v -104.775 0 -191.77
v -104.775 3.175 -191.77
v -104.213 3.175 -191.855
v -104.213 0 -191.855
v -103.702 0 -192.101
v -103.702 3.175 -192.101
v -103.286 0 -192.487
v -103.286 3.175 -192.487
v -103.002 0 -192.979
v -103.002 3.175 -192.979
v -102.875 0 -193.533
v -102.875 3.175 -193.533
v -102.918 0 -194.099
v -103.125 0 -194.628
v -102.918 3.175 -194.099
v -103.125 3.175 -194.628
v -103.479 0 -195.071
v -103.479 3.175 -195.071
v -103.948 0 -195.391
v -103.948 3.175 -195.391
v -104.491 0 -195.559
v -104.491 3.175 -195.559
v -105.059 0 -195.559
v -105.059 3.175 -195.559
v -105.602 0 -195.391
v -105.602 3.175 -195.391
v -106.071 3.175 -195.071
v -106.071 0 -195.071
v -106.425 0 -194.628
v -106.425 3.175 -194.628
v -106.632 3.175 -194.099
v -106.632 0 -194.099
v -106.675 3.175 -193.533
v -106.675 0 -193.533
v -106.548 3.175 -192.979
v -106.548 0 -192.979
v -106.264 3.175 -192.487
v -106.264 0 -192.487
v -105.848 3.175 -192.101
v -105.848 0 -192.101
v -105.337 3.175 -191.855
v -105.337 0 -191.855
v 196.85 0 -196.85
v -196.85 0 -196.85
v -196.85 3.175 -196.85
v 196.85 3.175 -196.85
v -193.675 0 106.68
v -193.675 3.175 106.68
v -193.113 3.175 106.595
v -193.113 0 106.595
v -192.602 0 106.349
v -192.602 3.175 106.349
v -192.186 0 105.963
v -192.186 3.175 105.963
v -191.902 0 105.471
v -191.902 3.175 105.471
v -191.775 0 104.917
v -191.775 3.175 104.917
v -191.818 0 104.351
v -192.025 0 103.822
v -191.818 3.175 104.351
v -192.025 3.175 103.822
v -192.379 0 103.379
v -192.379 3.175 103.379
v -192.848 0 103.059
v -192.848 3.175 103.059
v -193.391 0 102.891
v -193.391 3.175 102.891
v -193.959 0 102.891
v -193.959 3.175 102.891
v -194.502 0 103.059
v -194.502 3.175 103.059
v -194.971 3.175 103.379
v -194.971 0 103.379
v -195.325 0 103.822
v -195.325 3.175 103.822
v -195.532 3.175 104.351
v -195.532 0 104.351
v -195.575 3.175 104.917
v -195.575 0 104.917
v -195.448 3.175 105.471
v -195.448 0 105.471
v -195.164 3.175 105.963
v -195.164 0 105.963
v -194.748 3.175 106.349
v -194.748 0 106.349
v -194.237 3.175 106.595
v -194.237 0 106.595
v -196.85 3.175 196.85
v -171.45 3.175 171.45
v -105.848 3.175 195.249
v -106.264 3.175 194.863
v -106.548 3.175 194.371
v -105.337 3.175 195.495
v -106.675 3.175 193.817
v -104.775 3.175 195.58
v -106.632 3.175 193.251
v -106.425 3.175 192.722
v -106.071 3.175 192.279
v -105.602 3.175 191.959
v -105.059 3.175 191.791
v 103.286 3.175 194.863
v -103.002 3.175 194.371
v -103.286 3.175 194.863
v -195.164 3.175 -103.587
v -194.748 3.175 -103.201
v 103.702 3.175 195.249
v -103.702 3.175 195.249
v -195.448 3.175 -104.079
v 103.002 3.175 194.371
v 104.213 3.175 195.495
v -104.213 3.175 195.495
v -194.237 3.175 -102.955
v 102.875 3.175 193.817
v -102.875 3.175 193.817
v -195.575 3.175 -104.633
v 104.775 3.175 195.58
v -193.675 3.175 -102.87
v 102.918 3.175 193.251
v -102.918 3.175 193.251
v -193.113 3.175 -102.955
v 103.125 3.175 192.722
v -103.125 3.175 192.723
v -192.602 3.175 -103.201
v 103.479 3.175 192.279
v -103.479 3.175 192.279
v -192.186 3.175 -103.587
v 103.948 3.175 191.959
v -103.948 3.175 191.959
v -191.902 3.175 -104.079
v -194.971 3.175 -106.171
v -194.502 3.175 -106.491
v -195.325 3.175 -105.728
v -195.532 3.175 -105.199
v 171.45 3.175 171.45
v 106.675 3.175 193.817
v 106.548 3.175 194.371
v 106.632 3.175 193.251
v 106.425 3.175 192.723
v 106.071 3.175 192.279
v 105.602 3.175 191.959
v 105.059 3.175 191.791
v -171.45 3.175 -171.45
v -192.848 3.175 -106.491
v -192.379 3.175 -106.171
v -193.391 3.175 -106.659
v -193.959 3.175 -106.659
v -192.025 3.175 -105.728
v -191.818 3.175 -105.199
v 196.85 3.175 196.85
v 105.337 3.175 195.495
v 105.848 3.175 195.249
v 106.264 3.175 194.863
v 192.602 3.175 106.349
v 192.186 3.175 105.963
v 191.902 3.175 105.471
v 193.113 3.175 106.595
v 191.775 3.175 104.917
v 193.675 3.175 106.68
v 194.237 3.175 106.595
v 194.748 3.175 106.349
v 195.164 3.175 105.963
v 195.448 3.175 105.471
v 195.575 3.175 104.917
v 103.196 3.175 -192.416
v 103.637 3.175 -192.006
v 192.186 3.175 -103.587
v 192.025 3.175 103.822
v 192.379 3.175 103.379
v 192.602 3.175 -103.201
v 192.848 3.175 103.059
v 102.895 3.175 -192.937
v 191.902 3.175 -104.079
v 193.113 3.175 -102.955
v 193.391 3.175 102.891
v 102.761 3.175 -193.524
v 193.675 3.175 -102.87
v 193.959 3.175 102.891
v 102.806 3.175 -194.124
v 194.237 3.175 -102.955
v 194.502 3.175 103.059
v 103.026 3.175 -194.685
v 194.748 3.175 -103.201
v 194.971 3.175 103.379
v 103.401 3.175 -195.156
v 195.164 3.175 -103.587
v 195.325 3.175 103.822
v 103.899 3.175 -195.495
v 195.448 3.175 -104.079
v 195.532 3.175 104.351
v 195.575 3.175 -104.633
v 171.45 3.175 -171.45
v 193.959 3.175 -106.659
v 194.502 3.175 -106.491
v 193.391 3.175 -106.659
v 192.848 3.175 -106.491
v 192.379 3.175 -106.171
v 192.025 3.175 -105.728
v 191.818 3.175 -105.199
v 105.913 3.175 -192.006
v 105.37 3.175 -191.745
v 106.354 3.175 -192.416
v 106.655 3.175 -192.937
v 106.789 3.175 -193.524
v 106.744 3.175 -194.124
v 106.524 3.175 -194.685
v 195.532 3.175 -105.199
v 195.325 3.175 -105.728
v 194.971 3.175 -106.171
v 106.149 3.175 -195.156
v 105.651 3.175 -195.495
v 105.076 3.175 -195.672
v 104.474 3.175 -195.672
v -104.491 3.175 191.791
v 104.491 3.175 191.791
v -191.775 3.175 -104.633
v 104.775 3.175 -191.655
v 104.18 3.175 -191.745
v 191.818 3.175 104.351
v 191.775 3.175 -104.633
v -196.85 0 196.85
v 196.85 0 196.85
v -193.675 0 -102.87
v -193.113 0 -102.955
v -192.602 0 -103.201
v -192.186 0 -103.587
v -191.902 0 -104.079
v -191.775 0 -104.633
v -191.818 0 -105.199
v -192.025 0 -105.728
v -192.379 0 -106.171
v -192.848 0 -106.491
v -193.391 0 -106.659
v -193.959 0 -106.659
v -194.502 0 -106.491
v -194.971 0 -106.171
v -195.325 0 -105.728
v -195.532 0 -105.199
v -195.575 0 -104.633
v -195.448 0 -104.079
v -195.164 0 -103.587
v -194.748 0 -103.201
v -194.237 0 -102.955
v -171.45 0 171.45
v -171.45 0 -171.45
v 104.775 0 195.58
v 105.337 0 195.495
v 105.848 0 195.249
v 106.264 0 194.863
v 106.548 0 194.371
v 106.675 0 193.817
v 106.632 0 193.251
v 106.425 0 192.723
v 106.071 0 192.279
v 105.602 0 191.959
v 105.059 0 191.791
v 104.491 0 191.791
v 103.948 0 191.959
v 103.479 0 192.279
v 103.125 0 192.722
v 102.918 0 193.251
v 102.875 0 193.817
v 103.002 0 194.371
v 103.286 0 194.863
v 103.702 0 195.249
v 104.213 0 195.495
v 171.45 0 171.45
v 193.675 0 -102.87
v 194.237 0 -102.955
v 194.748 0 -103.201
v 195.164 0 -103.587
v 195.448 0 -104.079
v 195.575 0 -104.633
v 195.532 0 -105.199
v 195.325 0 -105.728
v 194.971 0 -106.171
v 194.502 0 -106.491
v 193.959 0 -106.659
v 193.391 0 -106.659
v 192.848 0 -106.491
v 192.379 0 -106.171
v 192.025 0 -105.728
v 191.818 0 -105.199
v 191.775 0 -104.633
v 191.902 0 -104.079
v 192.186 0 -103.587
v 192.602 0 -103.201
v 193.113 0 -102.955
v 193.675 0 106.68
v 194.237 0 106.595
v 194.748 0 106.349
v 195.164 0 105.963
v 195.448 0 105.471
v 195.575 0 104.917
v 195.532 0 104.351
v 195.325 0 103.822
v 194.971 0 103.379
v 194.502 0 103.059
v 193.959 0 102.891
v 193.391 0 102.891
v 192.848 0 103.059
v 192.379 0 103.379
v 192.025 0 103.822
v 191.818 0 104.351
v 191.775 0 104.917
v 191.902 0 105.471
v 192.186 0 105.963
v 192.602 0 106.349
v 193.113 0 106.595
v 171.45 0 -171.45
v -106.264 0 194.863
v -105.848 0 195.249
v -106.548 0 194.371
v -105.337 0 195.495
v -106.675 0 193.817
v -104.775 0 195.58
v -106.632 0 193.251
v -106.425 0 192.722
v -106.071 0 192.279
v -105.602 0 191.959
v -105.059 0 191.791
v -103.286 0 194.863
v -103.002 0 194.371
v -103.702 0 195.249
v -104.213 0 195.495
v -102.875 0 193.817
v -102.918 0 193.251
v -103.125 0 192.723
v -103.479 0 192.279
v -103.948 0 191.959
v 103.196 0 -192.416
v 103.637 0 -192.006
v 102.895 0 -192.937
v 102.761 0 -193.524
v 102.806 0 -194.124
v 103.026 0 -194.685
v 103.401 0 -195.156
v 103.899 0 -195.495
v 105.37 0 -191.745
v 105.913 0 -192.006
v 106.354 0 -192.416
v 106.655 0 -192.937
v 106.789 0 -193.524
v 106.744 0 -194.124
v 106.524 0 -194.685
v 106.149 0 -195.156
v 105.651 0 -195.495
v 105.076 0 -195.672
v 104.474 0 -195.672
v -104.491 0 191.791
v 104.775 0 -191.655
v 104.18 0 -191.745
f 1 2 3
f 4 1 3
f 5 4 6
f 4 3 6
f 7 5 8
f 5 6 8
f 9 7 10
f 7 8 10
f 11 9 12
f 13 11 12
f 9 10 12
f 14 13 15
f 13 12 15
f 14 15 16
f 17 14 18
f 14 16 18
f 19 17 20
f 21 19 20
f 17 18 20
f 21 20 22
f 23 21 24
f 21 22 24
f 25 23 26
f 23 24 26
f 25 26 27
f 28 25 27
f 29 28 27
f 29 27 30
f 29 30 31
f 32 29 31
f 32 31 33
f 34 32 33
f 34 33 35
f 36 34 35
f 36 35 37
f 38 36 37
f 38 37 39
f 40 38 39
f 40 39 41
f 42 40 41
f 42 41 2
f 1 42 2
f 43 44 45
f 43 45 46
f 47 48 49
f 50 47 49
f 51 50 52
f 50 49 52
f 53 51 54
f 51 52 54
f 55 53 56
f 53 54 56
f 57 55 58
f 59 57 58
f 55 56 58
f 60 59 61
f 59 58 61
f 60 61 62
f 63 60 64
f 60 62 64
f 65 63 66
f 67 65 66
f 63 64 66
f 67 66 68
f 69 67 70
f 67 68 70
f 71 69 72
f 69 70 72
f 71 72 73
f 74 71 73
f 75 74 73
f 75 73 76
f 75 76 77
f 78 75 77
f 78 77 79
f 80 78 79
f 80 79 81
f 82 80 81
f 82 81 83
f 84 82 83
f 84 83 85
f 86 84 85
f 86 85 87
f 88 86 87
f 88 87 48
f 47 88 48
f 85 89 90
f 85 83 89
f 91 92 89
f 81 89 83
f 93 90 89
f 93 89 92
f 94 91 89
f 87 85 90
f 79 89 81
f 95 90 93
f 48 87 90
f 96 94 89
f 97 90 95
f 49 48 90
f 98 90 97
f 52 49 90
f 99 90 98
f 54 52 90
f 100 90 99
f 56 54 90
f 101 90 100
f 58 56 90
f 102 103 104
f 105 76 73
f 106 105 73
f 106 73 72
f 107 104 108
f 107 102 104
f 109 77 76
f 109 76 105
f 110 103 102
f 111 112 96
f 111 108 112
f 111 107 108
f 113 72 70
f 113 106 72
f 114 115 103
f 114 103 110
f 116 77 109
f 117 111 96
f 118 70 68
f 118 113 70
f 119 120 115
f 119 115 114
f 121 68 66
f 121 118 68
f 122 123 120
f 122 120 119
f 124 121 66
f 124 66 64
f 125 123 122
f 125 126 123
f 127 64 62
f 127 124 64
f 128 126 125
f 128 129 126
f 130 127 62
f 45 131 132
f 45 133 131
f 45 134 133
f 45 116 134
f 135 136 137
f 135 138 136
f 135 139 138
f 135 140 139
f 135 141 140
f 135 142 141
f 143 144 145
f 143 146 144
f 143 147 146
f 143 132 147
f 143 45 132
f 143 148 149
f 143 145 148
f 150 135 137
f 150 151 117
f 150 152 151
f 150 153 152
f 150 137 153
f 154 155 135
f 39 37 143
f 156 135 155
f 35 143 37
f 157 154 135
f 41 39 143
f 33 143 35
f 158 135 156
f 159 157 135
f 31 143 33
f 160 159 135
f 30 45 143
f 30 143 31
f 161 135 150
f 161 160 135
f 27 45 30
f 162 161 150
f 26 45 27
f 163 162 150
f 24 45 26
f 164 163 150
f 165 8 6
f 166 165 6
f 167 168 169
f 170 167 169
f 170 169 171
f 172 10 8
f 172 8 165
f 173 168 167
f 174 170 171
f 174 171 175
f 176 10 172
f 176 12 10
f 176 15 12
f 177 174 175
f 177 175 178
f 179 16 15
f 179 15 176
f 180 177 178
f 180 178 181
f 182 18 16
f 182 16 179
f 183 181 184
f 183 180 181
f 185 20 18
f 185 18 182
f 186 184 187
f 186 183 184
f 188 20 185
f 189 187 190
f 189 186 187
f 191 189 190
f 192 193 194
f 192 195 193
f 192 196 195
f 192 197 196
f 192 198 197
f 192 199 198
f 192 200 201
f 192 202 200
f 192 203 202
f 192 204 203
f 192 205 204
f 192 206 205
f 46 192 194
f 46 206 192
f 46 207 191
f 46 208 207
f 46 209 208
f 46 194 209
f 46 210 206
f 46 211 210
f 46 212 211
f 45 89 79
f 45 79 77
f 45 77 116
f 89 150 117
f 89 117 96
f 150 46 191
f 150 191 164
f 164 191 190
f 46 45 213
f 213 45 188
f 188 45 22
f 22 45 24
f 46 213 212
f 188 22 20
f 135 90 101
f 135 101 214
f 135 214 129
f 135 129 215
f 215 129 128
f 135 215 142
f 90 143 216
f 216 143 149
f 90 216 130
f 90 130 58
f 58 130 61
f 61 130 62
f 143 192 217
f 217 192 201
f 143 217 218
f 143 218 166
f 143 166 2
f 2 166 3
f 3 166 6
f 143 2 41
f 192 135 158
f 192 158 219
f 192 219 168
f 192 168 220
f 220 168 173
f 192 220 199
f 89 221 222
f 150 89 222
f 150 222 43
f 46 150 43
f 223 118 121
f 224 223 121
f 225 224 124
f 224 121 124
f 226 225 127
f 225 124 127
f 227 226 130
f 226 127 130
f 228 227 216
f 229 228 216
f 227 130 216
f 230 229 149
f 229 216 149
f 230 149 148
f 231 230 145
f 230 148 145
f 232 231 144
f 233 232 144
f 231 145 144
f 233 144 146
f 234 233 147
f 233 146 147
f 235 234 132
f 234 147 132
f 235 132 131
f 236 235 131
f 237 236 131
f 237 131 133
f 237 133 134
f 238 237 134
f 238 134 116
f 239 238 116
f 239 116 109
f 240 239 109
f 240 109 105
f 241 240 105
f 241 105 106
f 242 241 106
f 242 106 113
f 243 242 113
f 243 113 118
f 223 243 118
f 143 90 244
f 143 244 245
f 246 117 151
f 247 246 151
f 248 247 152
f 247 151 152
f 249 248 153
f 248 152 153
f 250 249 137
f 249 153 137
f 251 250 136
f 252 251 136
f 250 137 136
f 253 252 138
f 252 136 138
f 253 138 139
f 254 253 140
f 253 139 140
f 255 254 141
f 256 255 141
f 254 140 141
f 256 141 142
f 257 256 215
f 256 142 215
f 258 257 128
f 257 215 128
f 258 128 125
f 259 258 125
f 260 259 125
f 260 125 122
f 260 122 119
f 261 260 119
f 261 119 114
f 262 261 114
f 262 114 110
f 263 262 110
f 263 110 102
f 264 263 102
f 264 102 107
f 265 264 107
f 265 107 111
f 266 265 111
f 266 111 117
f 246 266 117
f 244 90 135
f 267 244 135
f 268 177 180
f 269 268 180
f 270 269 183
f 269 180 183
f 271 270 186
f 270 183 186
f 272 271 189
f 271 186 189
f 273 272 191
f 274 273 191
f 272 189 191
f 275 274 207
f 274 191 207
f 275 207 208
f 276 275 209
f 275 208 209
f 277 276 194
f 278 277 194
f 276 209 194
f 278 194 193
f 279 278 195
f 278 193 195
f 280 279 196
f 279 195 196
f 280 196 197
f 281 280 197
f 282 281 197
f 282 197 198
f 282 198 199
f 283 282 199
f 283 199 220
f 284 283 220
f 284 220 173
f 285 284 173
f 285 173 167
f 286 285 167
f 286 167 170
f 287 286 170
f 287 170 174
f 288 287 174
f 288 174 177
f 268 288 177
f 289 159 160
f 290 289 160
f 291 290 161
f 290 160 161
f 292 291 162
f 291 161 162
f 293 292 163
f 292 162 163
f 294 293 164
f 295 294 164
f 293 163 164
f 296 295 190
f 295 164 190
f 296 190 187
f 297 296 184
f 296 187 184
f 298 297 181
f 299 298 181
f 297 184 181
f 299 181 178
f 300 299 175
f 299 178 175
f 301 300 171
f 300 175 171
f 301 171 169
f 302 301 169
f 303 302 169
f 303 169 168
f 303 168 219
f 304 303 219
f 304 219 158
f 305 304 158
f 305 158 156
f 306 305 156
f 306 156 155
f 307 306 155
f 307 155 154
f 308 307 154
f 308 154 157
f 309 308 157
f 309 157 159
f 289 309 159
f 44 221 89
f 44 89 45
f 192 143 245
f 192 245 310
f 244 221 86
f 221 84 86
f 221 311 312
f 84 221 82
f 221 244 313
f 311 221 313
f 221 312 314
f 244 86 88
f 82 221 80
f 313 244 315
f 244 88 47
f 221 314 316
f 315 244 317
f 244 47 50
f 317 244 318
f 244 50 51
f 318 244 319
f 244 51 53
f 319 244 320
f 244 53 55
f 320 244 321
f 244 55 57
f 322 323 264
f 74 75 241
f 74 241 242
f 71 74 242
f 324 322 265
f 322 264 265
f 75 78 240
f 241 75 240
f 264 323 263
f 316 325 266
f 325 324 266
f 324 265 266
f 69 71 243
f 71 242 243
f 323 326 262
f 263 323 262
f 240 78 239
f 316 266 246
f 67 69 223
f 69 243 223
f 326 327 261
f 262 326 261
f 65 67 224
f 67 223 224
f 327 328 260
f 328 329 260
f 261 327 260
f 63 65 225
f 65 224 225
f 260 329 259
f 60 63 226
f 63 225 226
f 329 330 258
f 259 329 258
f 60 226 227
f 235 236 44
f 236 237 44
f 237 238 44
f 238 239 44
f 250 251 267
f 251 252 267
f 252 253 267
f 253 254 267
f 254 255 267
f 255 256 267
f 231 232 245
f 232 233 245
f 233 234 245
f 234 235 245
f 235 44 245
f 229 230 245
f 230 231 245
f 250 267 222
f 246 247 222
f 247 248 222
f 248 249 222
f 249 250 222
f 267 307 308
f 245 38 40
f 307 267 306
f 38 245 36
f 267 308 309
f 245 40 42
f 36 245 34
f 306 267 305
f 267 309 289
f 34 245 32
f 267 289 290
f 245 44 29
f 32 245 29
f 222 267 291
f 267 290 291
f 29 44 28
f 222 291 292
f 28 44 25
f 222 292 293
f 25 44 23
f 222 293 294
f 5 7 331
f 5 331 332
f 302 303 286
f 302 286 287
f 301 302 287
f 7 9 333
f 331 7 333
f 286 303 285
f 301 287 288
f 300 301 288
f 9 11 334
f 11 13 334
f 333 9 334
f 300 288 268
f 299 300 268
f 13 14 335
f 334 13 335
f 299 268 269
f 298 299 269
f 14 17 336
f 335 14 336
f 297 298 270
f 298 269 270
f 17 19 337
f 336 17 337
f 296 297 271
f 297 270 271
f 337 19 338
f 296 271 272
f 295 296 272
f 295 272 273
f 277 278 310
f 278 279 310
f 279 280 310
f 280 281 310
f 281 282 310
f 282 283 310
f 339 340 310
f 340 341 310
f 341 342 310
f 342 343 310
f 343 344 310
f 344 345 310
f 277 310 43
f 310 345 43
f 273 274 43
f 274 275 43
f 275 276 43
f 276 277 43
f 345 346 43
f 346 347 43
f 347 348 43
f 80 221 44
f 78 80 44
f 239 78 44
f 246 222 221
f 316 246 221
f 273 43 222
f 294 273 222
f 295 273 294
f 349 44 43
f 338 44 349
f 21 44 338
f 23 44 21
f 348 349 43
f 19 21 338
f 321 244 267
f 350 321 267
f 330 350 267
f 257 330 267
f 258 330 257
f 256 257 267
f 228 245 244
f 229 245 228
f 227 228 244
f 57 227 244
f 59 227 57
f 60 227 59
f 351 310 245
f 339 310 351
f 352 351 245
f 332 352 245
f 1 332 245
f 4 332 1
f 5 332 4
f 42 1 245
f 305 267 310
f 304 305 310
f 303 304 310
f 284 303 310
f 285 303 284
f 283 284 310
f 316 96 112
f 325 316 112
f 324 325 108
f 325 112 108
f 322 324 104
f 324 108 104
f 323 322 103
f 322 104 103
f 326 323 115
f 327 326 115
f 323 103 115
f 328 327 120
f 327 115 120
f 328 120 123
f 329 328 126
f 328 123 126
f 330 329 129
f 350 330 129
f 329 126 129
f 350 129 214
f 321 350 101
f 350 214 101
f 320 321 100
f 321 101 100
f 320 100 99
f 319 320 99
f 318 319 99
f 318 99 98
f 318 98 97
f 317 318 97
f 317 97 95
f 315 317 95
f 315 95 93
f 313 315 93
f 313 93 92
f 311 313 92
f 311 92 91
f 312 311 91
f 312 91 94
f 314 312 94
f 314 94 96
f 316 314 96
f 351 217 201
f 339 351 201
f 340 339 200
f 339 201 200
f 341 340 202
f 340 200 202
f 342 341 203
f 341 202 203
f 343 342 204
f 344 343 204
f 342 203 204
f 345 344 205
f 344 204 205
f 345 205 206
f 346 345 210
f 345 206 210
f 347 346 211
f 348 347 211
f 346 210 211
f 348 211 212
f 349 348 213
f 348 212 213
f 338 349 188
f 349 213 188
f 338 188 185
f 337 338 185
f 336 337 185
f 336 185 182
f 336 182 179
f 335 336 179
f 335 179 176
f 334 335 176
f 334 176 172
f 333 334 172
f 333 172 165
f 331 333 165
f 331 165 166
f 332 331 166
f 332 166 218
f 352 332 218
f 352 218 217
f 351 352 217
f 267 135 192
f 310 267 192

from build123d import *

# Parameters (mm, degrees)
SKETCH1_W           = 393.7
SKETCH1_H           = 393.7
BOSS_EXTRUDE1_DEPTH = 3.175
SKETCH2_W           = 342.9
SKETCH2_H           = 342.9
CUT_EXTRUDE1_DEPTH  = 279.40604452
SKETCH3_R           = 1.905
SKETCH3_R_2         = 2.01965575
CUT_EXTRUDE2_DEPTH  = 279.40604452


with BuildPart() as part:
    # Sketch1 → Boss-Extrude1 (new body)
    with BuildSketch(Plane(origin=(0, 0, 0), x_dir=(1, 0, 0), z_dir=(0, 1, 0))):
        Rectangle(SKETCH1_W, SKETCH1_H)
    extrude(amount=BOSS_EXTRUDE1_DEPTH)

    # Sketch2 → Cut-Extrude1 (cut, through all)
    with BuildSketch(Plane(origin=(0, 3.175, 0), x_dir=(1, 0, 0), z_dir=(0, 1, 0))):
        Rectangle(SKETCH2_W, SKETCH2_H)
    extrude(amount=-CUT_EXTRUDE1_DEPTH, mode=Mode.SUBTRACT)

    # Sketch3 → Cut-Extrude2 (cut, through all)
    with BuildSketch(Plane(origin=(0, 3.175, 0), x_dir=(1, 0, 0), z_dir=(0, 1, 0))):
        with Locations(Location((-104.775, -193.675, 0), (0, 0, 270))):
            Circle(SKETCH3_R)
        with Locations(Location((104.775, -193.675, 0), (0, 0, 270))):
            Circle(SKETCH3_R)
        with Locations(Location((-193.675, -104.775, 0), (0, 0, 270))):
            Circle(SKETCH3_R)
        with Locations(Location((-193.675, 104.775, 0), (0, 0, 270))):
            Circle(SKETCH3_R)
        with Locations(Location((-104.775, 193.675, 0), (0, 0, 270))):
            Circle(SKETCH3_R)
        with Locations(Location((104.775, 193.675, 0), (0, 0, 270))):
            Circle(SKETCH3_R_2)
        with Locations(Location((193.675, 104.775, 0), (0, 0, 270))):
            Circle(SKETCH3_R)
        with Locations(Location((193.675, -104.775, 0), (0, 0, 270))):
            Circle(SKETCH3_R)
    extrude(amount=-CUT_EXTRUDE2_DEPTH, mode=Mode.SUBTRACT)


solid = part.part
